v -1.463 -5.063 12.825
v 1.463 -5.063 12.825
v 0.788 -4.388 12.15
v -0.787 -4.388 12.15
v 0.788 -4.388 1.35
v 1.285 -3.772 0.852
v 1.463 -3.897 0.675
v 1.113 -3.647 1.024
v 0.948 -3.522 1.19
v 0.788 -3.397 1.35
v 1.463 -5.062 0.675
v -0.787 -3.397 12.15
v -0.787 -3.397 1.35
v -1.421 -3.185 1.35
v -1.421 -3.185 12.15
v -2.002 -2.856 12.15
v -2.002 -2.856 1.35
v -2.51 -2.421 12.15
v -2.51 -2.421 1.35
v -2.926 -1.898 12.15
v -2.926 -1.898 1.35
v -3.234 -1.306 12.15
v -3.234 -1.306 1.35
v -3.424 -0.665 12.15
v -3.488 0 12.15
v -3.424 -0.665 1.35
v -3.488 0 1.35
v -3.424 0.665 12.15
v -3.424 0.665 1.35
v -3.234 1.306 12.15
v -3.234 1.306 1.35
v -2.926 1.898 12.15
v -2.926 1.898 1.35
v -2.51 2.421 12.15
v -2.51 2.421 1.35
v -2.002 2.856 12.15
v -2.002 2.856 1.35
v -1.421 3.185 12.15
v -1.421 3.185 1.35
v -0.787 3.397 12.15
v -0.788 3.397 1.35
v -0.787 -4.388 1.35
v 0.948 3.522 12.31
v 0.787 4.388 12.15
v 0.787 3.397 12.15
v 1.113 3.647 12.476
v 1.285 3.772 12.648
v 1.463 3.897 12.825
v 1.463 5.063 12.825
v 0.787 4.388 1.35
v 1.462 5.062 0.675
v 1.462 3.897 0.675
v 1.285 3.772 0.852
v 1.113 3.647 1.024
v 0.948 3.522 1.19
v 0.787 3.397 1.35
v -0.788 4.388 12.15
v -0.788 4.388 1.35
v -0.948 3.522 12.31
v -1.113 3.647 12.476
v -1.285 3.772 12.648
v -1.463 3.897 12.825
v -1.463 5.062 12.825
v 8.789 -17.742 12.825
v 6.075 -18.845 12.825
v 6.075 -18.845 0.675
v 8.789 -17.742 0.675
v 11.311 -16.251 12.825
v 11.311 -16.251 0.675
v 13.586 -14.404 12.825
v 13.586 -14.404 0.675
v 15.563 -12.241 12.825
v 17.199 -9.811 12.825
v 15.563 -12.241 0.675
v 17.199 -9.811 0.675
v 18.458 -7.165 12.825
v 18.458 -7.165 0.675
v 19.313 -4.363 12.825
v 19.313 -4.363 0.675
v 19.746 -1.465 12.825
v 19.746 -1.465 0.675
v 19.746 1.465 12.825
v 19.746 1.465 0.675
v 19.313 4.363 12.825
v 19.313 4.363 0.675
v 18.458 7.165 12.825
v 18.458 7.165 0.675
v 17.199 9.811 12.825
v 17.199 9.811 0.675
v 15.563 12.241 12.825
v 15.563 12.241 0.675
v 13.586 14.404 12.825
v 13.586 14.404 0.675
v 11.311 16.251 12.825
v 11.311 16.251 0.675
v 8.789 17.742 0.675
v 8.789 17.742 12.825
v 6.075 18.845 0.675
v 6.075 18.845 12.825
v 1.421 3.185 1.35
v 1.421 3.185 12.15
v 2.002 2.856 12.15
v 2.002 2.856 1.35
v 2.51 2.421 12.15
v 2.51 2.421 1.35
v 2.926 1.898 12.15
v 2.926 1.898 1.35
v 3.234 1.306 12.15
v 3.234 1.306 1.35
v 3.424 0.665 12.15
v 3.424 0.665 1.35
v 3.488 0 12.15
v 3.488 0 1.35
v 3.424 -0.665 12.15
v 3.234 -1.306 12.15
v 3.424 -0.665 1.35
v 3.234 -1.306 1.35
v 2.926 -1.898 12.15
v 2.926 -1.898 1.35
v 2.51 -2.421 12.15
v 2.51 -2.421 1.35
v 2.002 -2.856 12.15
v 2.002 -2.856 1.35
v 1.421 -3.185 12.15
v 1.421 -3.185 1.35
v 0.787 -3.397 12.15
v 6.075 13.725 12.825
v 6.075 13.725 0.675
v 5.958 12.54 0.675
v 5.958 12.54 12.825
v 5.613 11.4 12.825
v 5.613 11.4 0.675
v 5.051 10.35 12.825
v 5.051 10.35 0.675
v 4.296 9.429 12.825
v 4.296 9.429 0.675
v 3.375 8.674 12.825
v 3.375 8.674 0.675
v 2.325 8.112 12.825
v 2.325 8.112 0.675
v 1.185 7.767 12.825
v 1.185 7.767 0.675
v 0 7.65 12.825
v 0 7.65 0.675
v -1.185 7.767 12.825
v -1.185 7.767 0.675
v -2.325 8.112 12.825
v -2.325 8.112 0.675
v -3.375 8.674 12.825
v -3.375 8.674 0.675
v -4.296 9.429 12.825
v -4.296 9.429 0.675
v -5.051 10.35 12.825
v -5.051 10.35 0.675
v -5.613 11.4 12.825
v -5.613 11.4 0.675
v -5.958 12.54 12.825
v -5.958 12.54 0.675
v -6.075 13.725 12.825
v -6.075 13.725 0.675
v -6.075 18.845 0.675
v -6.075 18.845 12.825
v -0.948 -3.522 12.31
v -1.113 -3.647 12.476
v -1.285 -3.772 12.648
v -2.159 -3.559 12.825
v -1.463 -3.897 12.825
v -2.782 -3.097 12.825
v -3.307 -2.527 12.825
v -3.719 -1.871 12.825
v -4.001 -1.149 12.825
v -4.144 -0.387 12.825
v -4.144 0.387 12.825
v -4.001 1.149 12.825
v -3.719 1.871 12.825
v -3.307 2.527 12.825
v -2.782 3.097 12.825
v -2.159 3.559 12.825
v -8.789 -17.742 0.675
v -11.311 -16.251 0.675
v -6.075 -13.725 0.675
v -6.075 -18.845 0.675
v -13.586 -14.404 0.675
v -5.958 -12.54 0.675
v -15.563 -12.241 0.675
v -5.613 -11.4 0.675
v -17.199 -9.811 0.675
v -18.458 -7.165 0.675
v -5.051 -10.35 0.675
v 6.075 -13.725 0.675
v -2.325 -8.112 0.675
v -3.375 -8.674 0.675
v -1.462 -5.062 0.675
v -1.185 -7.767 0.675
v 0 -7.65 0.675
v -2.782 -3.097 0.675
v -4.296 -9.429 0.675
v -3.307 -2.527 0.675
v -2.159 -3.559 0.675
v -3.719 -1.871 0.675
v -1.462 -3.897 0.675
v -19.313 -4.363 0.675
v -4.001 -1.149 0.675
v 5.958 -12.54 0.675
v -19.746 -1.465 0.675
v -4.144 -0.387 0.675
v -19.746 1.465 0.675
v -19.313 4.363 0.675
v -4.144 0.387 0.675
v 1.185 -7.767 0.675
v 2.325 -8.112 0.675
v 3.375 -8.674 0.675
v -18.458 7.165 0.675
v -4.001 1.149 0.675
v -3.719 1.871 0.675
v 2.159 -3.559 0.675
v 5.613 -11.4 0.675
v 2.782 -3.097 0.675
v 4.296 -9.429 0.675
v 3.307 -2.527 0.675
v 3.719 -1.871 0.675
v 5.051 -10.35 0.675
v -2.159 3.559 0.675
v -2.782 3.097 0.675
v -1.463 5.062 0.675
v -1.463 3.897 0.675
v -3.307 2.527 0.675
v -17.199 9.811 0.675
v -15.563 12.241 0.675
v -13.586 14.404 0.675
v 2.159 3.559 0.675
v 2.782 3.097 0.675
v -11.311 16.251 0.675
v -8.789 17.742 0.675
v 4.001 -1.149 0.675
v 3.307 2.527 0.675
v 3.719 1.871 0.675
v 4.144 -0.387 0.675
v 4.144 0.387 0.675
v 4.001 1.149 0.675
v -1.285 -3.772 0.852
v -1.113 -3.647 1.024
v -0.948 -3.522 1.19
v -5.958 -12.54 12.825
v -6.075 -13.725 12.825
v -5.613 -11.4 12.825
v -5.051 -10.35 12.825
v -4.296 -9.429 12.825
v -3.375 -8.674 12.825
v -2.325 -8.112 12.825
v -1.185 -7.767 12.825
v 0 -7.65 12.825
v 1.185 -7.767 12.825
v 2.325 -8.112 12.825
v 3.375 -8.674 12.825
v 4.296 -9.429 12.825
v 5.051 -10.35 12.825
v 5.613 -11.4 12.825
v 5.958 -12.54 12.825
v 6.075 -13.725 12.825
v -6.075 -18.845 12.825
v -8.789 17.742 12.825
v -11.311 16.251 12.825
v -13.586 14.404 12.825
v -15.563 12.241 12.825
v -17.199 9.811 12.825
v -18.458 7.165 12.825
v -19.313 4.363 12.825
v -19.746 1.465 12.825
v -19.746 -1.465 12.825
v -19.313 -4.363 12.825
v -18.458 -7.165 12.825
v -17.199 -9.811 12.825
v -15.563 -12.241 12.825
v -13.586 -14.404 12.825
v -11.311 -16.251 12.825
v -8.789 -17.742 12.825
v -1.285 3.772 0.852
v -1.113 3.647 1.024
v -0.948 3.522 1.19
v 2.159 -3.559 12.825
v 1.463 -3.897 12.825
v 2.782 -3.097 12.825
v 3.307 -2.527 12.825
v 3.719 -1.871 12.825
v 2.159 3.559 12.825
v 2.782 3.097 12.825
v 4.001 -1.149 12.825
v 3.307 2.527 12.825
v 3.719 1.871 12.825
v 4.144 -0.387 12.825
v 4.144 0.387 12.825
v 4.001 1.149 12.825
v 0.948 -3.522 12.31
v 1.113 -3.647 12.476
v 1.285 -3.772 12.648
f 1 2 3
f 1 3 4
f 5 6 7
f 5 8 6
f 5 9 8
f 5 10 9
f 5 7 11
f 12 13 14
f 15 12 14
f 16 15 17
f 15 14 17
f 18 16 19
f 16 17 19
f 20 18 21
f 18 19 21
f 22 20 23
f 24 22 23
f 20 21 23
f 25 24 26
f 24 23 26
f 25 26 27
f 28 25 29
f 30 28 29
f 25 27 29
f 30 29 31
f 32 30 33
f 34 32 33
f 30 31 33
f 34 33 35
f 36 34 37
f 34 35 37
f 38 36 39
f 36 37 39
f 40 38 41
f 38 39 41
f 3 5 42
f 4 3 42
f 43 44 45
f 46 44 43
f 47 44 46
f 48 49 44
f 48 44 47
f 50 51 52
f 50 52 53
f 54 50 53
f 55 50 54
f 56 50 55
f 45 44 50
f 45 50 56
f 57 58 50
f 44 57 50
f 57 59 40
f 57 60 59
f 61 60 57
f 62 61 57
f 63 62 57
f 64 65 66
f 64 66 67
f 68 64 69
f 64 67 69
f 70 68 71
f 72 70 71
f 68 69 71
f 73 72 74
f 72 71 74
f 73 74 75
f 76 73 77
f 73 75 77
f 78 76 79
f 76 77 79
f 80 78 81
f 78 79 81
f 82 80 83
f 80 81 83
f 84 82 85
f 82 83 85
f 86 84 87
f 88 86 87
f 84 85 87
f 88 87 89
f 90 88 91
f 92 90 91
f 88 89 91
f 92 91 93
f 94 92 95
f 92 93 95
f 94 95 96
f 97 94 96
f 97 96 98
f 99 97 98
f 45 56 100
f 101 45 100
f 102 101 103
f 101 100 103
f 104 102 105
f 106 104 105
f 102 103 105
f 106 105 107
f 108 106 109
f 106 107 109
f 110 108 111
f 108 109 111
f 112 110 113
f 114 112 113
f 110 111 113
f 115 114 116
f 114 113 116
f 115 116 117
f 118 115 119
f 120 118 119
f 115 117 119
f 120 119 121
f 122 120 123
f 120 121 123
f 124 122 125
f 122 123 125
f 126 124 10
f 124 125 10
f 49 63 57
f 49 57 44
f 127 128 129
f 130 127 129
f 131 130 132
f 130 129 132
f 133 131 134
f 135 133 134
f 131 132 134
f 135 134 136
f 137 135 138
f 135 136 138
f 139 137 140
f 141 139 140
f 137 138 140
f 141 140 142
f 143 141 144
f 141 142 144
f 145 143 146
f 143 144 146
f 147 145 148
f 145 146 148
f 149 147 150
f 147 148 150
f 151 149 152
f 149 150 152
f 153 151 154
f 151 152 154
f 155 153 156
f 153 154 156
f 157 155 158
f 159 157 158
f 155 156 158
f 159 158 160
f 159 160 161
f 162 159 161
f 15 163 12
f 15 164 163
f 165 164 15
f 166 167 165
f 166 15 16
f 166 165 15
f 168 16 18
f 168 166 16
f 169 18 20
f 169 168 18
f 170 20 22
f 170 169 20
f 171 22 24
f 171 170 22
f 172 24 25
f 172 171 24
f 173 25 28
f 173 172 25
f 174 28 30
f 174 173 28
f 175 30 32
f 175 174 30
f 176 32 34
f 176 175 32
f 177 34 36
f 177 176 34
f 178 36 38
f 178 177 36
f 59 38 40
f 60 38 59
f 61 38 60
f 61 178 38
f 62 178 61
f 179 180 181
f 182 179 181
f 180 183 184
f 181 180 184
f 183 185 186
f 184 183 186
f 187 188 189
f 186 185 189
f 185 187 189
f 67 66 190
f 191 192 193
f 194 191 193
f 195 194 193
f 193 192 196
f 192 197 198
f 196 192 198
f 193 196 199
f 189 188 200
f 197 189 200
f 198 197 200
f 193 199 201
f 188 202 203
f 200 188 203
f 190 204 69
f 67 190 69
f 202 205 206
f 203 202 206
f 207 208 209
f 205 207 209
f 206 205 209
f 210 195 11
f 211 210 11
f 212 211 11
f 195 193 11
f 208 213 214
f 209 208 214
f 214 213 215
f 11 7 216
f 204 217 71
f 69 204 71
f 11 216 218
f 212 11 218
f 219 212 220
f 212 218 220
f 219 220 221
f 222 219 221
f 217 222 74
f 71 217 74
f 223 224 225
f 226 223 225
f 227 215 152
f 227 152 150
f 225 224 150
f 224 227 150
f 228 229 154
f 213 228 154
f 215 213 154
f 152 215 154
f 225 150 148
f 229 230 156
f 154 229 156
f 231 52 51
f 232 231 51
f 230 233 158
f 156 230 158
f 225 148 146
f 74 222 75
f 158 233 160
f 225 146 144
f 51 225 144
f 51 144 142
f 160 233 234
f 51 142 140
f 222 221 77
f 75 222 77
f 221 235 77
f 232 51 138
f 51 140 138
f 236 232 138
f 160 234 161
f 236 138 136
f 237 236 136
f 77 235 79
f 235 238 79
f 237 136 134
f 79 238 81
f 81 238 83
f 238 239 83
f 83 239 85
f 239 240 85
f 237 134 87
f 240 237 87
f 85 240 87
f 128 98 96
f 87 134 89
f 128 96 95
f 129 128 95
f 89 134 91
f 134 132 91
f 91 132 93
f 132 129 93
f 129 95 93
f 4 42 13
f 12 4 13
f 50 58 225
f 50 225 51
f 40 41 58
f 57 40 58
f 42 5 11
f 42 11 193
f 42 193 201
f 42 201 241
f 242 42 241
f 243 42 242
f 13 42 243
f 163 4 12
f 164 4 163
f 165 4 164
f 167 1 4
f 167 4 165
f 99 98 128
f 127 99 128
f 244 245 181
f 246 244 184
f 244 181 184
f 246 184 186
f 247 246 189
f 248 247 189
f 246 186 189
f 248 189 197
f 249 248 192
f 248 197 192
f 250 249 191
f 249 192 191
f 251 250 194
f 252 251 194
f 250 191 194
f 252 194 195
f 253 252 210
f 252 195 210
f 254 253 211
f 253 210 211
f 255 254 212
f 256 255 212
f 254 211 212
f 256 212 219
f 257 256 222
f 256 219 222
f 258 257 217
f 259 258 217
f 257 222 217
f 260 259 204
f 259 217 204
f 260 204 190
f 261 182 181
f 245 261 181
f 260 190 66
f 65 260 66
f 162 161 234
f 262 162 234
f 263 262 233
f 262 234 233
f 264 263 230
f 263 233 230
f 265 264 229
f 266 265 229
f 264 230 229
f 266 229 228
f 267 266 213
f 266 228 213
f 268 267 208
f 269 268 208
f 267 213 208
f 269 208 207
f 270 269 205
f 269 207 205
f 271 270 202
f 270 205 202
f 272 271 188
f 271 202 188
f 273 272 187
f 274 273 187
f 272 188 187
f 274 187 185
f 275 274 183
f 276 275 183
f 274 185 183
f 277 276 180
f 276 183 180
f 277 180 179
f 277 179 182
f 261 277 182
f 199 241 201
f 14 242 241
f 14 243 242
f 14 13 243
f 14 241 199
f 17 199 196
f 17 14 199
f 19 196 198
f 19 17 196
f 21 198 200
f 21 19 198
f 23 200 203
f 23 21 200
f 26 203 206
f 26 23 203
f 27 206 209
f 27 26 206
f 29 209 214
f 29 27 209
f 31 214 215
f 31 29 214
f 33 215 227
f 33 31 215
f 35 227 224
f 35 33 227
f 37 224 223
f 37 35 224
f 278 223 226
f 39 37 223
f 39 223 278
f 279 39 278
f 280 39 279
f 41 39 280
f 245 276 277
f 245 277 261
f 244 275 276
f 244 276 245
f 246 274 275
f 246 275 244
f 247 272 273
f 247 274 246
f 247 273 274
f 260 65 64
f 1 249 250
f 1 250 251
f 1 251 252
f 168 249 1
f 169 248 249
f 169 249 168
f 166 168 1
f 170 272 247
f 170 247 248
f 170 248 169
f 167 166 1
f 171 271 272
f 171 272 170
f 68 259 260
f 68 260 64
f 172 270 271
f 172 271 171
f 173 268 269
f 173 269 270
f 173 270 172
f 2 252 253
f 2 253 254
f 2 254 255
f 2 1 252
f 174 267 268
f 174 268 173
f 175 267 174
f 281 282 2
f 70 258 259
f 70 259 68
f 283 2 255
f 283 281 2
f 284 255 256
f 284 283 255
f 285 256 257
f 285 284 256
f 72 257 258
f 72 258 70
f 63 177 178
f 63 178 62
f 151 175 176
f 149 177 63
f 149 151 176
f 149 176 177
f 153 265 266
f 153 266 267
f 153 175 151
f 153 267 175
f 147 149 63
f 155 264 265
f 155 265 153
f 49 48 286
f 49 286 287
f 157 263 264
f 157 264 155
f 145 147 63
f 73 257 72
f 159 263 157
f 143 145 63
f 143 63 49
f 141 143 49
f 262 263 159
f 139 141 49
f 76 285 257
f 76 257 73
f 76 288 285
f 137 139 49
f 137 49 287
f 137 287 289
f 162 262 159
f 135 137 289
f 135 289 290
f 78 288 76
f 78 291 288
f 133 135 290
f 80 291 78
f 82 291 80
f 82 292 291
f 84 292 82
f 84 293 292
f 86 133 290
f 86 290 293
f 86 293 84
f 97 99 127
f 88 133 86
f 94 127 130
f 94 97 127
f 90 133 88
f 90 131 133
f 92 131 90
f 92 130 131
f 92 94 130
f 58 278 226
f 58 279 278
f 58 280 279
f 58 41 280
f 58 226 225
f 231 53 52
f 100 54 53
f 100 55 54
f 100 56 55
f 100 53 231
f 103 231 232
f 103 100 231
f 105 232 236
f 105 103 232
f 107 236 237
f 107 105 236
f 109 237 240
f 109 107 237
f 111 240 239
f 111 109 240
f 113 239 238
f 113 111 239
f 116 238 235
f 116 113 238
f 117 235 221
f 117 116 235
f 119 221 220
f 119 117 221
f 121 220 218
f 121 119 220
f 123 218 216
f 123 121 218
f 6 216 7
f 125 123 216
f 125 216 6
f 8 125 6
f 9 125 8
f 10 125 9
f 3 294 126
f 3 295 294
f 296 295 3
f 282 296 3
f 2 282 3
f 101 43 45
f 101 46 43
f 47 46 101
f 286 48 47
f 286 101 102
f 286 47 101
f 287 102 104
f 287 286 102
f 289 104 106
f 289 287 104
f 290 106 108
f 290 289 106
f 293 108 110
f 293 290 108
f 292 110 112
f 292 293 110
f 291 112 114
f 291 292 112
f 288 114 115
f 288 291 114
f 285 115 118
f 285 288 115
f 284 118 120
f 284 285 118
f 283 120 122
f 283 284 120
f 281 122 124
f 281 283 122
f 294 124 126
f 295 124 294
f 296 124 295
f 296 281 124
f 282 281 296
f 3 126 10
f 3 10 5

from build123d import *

# Parameters (mm, degrees)
BOSS_EXTRUDE1_DEPTH = 13.5
CHAMFER1_SIZE       = 0.75
CHAMFER2_SIZE       = 0.75
SCALE1_SCALE        = 0.9


with BuildPart() as part:
    # Sketch1 → Boss-Extrude1 (new body)
    # profile 1 of 3: a face of its own
    with BuildSketch(Plane.XY):
        with BuildLine():
            Line((-6.750000000000002, 15.249999999999998), (-6.750000000000003, 20.93889920697836))
            ThreePointArc((-6.750000000000044, 20.93889920697837), (-22, -1.685e-14), (-6.750000000000026, -20.938899206978377))
            Line((-6.749999999999997, -20.938899206978377), (-6.749999999999998, -15.25000000517543))
            Line((-6.749999999999998, -15.25000000517543), (-6.750000000000002, 15.249999999999998))
        make_face()
    # profile 2 of 3: a face of its own
    with BuildSketch(Plane.XY):
        with BuildLine():
            ThreePointArc((22, 0), (17.78341924377873, 12.95183384698863), (6.749999999999977, 20.93889920697839))
            Line((6.749999999999997, 20.938899206978398), (6.749999999999998, 15.25))
            Line((6.749999999999998, 15.25), (6.750000000000002, -15.25))
            Line((6.750000000000002, -15.25), (6.750000000000003, -20.93889920697839))
            ThreePointArc((6.749999999999982, -20.938899206978387), (17.78341924377873, -12.95183384698863), (22, -5.39e-15))
        make_face()
    # profile 3 of 3: a face of its own
    with BuildSketch(Plane.XY):
        with BuildLine():
            ThreePointArc((6.749999999999999, 15.249999999999998), (-1.24e-15, 8.5), (-6.749999999999999, 15.25))
            Line((-6.750000000000002, 15.249999999999998), (-6.749999999999998, -15.25000000517543))
            ThreePointArc((-6.75, -15.250000005175428), (-2.58771413e-09, -8.5), (6.75, -15.25))
            Line((6.750000000000002, -15.25), (6.749999999999998, 15.25))
        make_face()
        with BuildLine():
            Line((-0.8750000000000007, 3.7749172176354118), (-0.8750000000000008, 4.875))
            Line((-0.8750000000000008, 4.875), (0.8749999999999992, 4.875))
            Line((0.8749999999999992, 4.875), (0.8749999999999993, 3.774917217635379))
            ThreePointArc((0.8749999999999902, 3.774917217635377), (3.033665274877896, 2.4109126902482427), (3.875, 0))
            ThreePointArc((3.875, -9.5e-16), (3.033665274877896, -2.4109126902482427), (0.8749999999999918, -3.7749172176353767))
            Line((0.8750000000000004, -3.7749172176353767), (0.8750000000000006, -4.875))
            Line((0.8750000000000006, -4.875), (-0.8749999999999994, -4.875))
            Line((-0.8749999999999994, -4.875), (-0.8749999999999996, -3.774917217635412))
            ThreePointArc((-0.8749999999999161, -3.7749172176353945), (-3.875, 4.7e-16), (-0.8749999999999168, 3.774917217635394))
        make_face(mode=Mode.SUBTRACT)
    extrude(amount=BOSS_EXTRUDE1_DEPTH)

    # Chamfer1
    chamfer1_edges = [part.edges().sort_by_distance(p)[0] for p in [
        (-0.8749999999999996, -4.324958608817706, 0),
        (5.6e-16, -4.875, 0),
        (0.8750000000000004, -4.324958608817688, 0),
        (3.875, 1.22e-15, 0),
        (0.8749999999999993, 4.324958608817689, 0),
        (-7.8e-16, 4.875, 0),
        (-0.8750000000000007, 4.324958608817706, 0),
        (-3.8749999999999996, -3.3e-16, 0),
    ]]
    chamfer(chamfer1_edges, length=CHAMFER1_SIZE)

    # Chamfer2
    chamfer2_edges = [part.edges().sort_by_distance(p)[0] for p in [
        (-3.8749999999999996, -3.3e-16, 13.5),
        (-0.8750000000000007, 4.324958608817706, 13.5),
        (-7.8e-16, 4.875, 13.5),
        (0.8749999999999993, 4.324958608817689, 13.5),
        (3.875, -2.2e-16, 13.5),
        (0.8750000000000004, -4.324958608817688, 13.5),
        (5.6e-16, -4.875, 13.5),
        (-0.8749999999999996, -4.324958608817706, 13.5),
    ]]
    chamfer(chamfer2_edges, length=CHAMFER2_SIZE)


with BuildPart() as part_1:
    # Scale1: scaled about (0, 0, 6.75)
    add(part.part.scale(SCALE1_SCALE).moved(Location((0, 0, 0.6749999999999998))))


solid = part_1.part
